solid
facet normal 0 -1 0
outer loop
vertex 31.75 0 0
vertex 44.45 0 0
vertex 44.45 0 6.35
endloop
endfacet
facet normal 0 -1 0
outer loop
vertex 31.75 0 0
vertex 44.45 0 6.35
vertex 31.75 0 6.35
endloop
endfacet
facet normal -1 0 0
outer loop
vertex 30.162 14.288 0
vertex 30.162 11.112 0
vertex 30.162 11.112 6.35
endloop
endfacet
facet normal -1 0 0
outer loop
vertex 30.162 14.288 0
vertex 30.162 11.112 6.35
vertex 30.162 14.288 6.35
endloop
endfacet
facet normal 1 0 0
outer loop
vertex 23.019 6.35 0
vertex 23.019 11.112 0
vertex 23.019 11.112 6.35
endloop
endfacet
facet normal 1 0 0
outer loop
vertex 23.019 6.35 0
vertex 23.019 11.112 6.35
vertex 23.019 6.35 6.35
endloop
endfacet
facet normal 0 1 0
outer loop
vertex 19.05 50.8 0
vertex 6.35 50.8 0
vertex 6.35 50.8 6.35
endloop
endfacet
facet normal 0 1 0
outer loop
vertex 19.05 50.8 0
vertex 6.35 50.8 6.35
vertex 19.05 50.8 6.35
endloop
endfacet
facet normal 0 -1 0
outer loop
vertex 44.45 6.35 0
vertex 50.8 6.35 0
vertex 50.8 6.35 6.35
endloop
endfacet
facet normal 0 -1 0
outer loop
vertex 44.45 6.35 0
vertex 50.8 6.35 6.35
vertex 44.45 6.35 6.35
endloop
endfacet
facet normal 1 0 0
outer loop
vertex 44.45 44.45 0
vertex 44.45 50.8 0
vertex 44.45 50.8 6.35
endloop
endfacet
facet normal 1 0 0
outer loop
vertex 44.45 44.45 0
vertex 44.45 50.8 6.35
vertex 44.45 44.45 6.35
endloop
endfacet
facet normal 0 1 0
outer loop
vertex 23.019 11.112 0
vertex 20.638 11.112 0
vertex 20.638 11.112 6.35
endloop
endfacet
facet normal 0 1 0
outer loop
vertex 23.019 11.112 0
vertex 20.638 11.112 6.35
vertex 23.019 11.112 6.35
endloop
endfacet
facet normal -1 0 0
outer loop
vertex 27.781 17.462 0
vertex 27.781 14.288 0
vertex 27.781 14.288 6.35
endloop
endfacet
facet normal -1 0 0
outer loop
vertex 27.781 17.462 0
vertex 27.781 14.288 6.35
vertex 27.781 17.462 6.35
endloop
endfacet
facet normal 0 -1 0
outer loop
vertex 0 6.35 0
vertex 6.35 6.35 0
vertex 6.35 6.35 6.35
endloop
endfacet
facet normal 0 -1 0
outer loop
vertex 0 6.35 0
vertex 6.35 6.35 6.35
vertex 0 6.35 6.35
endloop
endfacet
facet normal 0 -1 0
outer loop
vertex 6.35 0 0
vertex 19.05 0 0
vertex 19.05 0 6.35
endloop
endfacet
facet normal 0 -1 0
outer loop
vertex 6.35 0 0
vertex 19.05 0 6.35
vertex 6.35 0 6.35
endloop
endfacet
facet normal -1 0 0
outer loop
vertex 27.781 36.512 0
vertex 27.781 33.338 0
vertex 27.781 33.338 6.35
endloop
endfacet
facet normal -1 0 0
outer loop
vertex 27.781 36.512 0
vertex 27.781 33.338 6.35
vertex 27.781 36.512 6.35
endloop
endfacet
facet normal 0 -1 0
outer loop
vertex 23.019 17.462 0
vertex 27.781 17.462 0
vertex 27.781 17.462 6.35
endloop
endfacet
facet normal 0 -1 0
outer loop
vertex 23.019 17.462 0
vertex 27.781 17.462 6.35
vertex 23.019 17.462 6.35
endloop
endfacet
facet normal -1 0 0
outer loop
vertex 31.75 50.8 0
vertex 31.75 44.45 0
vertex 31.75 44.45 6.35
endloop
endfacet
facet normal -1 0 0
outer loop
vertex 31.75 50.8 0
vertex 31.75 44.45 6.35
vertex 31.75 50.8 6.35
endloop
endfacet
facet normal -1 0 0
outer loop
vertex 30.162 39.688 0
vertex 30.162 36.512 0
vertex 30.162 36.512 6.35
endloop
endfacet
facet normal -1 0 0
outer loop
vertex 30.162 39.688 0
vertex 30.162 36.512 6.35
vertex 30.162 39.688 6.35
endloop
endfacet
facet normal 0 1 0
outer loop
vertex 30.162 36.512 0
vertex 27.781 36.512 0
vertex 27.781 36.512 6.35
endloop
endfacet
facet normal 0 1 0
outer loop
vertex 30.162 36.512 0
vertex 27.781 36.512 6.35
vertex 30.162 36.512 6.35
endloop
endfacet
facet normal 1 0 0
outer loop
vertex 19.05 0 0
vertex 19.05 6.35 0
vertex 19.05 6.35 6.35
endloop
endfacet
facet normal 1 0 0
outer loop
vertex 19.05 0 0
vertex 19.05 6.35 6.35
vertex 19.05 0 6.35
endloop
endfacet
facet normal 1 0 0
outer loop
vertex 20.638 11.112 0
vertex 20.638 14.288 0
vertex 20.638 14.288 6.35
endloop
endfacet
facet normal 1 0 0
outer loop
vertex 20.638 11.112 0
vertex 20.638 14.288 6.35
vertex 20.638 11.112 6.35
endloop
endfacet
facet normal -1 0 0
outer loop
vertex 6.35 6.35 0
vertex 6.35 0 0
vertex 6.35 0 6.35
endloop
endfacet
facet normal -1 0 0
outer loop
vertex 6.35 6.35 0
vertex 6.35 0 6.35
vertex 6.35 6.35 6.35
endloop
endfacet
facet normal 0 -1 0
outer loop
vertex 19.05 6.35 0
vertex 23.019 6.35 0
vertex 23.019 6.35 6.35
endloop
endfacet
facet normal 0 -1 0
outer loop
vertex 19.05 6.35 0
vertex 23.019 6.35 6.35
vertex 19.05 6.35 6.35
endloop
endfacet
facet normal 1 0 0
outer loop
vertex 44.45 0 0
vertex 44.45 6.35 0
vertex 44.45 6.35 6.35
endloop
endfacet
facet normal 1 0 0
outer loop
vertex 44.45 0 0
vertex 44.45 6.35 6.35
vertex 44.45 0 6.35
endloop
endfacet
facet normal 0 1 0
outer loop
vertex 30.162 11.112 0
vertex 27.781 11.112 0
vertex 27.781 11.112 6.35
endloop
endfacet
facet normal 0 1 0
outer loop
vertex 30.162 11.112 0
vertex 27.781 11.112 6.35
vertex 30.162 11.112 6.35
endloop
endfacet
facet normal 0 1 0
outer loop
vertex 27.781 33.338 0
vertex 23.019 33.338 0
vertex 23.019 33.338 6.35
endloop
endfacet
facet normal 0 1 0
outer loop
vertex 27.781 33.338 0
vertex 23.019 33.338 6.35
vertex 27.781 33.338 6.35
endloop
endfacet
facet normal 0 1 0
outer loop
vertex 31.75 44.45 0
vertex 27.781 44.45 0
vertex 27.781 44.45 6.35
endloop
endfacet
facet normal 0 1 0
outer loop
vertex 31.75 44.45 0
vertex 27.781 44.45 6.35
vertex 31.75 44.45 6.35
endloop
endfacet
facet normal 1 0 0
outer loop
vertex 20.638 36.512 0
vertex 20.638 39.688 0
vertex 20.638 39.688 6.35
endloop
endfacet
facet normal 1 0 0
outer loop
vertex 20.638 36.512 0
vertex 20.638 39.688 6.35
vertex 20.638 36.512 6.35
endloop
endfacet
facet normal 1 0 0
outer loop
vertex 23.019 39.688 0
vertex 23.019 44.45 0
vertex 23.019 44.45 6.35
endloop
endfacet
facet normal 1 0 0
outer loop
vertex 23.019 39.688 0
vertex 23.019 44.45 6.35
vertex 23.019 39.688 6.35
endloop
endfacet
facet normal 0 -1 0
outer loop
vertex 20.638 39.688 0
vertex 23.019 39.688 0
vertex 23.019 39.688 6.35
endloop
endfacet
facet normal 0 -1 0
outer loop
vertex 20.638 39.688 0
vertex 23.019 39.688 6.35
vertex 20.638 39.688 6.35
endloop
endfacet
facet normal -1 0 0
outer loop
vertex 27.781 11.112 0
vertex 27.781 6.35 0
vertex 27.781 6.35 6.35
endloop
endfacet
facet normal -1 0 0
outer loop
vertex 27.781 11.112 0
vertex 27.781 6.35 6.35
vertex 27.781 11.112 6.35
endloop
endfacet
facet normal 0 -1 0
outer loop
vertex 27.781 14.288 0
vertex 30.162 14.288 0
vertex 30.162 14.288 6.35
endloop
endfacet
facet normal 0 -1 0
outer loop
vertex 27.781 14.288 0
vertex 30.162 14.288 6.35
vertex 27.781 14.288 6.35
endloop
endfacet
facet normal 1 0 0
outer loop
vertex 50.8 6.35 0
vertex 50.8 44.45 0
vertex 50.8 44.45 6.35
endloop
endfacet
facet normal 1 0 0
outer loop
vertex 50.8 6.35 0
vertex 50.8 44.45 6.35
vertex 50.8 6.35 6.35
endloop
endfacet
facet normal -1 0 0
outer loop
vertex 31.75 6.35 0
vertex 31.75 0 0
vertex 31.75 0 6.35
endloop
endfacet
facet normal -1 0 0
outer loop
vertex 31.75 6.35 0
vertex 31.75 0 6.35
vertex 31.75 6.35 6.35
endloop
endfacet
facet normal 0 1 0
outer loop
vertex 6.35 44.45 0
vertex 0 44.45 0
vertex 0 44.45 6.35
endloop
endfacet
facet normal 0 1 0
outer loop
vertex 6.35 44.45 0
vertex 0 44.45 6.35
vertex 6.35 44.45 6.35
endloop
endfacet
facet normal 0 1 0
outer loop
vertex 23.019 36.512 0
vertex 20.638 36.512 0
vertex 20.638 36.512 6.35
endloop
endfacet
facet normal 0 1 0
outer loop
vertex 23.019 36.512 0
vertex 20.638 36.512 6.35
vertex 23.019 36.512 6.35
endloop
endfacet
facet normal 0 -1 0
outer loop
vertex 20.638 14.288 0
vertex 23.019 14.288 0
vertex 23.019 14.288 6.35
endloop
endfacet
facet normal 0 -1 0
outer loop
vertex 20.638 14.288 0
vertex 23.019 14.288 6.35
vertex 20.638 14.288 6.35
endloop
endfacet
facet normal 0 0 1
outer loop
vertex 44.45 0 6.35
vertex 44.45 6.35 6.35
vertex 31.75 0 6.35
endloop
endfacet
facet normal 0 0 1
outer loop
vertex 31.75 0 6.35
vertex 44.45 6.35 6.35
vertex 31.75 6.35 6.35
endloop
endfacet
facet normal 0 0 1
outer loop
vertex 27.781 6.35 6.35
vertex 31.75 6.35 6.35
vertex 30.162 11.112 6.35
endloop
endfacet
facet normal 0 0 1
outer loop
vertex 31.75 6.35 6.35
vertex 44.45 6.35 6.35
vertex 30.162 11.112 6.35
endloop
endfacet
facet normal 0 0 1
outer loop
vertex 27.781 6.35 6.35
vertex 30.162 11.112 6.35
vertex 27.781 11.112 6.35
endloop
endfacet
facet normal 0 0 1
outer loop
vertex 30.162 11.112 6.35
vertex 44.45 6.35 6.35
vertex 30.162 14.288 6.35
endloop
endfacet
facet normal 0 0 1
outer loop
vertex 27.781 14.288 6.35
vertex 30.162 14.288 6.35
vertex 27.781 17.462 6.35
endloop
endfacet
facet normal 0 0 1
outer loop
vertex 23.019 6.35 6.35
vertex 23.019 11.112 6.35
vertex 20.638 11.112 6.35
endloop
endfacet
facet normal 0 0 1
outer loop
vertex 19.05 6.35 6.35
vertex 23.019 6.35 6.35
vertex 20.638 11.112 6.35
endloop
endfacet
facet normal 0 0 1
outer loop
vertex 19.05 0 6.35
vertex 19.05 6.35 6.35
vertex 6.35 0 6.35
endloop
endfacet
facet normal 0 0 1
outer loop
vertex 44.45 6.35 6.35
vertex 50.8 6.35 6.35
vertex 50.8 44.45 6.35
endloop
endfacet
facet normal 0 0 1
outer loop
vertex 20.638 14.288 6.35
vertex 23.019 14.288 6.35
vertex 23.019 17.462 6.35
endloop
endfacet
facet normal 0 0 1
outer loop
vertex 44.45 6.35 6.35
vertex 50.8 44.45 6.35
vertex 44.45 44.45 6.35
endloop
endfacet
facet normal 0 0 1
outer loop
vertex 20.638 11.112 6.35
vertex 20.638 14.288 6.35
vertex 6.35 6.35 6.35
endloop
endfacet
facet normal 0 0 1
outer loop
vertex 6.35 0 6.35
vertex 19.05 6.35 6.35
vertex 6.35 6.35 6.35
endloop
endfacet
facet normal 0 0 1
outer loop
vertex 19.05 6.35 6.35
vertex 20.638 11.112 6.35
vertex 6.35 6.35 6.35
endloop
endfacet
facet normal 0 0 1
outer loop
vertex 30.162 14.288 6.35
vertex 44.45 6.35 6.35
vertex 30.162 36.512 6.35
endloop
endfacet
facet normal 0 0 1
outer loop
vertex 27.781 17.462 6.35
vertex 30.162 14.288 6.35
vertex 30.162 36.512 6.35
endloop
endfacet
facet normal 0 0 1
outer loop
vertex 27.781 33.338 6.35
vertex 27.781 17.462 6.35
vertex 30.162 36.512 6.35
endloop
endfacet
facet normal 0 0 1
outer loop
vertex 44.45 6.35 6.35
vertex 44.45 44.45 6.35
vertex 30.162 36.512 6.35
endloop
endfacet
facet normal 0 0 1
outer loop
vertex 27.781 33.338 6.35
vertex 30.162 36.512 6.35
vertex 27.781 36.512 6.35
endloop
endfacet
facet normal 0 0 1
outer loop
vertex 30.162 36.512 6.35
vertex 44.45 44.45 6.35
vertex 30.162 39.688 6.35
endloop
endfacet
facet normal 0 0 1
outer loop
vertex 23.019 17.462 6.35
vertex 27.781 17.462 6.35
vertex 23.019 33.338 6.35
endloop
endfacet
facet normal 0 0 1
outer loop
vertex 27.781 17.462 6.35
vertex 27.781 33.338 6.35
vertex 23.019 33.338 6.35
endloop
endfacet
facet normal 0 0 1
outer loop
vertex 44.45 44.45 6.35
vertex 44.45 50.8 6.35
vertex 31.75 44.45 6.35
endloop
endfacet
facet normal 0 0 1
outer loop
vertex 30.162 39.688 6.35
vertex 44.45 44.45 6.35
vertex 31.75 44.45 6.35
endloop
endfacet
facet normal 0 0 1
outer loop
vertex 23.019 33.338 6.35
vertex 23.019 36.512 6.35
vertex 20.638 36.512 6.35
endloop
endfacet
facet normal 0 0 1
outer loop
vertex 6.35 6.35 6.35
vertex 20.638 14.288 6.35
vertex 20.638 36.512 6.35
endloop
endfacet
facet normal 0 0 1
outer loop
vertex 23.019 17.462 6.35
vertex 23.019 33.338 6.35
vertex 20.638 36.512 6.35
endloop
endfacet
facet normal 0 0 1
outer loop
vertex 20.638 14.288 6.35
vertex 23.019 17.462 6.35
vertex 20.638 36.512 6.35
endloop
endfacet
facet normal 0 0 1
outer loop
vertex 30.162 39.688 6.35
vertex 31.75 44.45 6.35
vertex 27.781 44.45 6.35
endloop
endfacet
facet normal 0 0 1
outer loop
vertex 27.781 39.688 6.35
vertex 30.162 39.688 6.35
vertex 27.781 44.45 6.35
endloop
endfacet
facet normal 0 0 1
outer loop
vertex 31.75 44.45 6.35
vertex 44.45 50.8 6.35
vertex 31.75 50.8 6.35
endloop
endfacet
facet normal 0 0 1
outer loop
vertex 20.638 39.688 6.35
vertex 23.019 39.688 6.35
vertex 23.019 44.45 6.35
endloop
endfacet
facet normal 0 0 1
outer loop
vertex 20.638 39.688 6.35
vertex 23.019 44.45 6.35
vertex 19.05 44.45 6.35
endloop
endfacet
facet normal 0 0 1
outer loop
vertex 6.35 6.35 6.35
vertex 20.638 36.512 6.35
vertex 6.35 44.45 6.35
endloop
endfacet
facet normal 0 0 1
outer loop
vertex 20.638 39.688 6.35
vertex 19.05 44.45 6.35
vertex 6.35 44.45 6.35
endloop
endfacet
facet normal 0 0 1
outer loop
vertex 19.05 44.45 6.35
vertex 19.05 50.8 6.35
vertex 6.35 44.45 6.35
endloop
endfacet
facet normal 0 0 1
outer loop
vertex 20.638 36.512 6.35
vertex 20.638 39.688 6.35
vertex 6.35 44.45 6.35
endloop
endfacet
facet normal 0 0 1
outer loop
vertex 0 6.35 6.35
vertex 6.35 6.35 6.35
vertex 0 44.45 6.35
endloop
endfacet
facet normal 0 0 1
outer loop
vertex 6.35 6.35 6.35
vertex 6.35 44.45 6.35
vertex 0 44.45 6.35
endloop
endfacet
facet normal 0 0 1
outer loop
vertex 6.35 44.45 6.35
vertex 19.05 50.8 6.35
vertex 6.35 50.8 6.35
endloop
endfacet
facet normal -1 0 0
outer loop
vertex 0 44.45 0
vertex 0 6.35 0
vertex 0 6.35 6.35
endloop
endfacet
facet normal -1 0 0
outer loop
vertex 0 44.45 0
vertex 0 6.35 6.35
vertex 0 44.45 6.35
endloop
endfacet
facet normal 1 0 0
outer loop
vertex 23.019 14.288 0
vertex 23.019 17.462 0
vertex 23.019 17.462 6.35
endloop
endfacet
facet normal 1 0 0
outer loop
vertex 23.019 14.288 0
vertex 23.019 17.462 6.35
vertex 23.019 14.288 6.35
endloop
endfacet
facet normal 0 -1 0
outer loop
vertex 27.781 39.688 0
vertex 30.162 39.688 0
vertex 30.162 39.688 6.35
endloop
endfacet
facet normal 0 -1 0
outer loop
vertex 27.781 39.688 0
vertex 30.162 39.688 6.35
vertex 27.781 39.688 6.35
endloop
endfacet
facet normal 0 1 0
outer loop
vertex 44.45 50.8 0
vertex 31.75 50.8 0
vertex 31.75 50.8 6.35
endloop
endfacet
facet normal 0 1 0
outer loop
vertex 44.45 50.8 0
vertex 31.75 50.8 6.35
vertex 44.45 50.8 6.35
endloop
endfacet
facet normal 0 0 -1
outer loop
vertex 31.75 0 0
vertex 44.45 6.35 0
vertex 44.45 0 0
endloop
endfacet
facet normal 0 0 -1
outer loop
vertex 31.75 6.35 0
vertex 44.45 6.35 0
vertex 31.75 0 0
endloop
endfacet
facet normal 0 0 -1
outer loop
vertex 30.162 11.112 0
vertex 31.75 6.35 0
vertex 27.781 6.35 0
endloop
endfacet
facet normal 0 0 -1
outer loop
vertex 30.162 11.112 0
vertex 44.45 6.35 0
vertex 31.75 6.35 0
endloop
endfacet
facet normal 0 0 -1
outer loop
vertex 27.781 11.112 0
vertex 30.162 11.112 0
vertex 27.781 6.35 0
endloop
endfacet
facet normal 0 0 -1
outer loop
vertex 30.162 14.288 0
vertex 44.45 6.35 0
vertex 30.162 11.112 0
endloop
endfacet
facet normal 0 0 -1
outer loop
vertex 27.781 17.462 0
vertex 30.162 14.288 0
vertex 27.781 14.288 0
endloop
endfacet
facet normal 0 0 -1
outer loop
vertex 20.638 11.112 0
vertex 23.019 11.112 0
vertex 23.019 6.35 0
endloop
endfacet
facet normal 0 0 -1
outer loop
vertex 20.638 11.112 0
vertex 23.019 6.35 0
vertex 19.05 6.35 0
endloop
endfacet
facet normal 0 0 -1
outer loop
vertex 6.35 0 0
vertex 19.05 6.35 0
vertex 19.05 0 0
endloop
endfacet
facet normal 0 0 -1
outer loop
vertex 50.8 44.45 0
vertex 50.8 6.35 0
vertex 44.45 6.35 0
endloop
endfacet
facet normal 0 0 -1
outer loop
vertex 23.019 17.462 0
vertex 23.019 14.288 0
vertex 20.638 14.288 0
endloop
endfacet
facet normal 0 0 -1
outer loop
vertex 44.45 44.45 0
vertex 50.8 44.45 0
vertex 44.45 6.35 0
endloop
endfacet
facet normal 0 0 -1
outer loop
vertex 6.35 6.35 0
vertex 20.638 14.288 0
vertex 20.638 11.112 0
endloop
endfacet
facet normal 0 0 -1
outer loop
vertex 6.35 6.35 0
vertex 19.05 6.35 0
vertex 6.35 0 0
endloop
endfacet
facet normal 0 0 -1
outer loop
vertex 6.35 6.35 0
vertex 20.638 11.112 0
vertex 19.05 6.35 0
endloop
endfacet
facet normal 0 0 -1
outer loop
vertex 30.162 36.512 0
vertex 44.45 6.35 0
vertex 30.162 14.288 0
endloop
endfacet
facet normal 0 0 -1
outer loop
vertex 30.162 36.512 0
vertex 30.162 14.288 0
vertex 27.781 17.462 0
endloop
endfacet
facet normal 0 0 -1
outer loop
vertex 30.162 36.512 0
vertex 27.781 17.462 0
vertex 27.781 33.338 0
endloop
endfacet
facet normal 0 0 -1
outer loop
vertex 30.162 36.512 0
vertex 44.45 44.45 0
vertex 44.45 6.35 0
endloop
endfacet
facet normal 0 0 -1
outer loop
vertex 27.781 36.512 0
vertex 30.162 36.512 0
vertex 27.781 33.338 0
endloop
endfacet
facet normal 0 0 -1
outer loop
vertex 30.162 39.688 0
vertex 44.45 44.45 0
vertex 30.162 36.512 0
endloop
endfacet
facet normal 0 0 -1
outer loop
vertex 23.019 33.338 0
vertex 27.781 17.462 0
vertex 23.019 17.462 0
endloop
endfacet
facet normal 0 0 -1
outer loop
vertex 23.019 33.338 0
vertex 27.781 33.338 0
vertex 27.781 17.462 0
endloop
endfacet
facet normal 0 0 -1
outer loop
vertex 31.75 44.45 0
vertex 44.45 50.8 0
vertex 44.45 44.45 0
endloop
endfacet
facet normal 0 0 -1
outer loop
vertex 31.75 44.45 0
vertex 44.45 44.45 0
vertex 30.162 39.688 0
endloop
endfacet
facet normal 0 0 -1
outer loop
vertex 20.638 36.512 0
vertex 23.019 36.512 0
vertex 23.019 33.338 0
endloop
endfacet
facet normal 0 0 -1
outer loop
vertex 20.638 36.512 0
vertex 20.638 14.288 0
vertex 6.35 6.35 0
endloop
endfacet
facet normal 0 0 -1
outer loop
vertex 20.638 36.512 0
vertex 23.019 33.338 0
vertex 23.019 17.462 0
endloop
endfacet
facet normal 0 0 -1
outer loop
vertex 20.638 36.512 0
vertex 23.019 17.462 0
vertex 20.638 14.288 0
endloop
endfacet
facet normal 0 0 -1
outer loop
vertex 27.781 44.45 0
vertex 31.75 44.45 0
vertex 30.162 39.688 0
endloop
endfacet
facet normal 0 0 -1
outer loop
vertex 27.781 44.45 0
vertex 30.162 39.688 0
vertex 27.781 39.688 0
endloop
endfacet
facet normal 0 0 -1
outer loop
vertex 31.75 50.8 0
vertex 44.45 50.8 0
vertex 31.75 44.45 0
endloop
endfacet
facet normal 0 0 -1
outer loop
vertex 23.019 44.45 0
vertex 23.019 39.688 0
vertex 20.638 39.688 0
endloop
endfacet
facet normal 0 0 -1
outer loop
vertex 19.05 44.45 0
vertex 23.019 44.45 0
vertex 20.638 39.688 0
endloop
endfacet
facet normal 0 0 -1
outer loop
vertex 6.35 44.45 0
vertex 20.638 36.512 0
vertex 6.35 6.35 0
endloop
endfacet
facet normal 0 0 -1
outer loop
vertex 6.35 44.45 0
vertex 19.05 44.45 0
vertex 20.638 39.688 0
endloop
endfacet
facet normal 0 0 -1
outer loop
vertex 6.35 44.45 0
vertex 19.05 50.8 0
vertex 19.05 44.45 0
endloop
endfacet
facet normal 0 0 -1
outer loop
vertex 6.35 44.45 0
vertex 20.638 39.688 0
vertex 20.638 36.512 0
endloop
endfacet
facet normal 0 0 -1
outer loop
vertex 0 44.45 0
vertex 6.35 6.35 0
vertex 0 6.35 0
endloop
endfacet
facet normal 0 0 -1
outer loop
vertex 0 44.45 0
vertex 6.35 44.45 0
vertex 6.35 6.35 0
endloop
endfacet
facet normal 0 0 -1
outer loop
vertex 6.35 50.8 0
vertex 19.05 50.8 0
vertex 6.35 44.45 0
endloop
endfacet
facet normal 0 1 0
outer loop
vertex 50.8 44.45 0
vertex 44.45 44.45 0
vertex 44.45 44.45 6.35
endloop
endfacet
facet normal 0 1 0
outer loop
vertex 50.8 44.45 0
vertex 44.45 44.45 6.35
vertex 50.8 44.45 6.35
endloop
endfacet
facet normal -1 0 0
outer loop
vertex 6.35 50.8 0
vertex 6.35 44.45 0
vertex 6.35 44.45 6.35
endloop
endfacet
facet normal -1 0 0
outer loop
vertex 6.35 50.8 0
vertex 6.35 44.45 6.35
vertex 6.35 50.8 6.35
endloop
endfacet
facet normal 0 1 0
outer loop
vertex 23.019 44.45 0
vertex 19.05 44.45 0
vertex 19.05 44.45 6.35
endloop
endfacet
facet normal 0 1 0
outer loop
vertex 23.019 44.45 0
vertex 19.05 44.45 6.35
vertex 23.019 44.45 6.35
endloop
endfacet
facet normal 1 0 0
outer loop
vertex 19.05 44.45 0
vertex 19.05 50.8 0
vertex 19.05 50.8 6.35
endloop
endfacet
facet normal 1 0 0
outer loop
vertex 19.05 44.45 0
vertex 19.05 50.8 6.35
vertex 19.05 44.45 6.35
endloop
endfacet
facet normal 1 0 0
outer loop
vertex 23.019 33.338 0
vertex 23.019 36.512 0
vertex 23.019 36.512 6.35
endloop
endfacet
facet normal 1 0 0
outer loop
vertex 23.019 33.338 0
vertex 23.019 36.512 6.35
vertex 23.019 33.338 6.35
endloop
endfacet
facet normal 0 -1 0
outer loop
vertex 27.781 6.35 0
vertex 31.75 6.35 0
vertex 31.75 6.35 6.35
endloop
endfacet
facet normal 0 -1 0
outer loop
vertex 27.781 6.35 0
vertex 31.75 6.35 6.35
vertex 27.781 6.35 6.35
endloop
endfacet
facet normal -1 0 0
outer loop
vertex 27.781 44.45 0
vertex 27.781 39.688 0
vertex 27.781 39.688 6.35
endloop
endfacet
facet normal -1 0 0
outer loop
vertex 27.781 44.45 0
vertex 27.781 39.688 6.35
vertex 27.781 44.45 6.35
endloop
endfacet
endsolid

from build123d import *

# Parameters (mm, degrees)
BOSS_EXTRUDE1_DEPTH = 6.35


with BuildPart() as part:
    # Sketch1 → Boss-Extrude1 (new body)
    with BuildSketch(Plane.XY):
        Polygon((27.78125, 44.45), (31.75, 44.45), (31.75, 50.8), (44.45, 50.8), (44.45, 44.45), (50.8, 44.45), (50.8, 6.35), (44.45, 6.35), (44.45, 0), (31.75, 0), (31.75, 6.35), (27.78125, 6.35), (27.78125, 11.1125), (30.1625, 11.1125), (30.1625, 14.2875), (27.78125, 14.2875), (27.78125, 17.4625), (23.01875, 17.4625), (23.01875, 14.2875), (20.6375, 14.2875), (20.6375, 11.1125), (23.01875, 11.1125), (23.01875, 6.35), (19.05, 6.35), (19.05, 0), (6.35, 0), (6.35, 6.35), (0, 6.35), (0, 44.45), (6.35, 44.45), (6.35, 50.8), (19.05, 50.8), (19.05, 44.45), (23.01875, 44.45), (23.01875, 39.6875), (20.6375, 39.6875), (20.6375, 36.5125), (23.01875, 36.5125), (23.01875, 33.3375), (27.78125, 33.3375), (27.78125, 36.5125), (30.1625, 36.5125), (30.1625, 39.6875), (27.78125, 39.6875), align=None)
    extrude(amount=BOSS_EXTRUDE1_DEPTH)


solid = part.part
